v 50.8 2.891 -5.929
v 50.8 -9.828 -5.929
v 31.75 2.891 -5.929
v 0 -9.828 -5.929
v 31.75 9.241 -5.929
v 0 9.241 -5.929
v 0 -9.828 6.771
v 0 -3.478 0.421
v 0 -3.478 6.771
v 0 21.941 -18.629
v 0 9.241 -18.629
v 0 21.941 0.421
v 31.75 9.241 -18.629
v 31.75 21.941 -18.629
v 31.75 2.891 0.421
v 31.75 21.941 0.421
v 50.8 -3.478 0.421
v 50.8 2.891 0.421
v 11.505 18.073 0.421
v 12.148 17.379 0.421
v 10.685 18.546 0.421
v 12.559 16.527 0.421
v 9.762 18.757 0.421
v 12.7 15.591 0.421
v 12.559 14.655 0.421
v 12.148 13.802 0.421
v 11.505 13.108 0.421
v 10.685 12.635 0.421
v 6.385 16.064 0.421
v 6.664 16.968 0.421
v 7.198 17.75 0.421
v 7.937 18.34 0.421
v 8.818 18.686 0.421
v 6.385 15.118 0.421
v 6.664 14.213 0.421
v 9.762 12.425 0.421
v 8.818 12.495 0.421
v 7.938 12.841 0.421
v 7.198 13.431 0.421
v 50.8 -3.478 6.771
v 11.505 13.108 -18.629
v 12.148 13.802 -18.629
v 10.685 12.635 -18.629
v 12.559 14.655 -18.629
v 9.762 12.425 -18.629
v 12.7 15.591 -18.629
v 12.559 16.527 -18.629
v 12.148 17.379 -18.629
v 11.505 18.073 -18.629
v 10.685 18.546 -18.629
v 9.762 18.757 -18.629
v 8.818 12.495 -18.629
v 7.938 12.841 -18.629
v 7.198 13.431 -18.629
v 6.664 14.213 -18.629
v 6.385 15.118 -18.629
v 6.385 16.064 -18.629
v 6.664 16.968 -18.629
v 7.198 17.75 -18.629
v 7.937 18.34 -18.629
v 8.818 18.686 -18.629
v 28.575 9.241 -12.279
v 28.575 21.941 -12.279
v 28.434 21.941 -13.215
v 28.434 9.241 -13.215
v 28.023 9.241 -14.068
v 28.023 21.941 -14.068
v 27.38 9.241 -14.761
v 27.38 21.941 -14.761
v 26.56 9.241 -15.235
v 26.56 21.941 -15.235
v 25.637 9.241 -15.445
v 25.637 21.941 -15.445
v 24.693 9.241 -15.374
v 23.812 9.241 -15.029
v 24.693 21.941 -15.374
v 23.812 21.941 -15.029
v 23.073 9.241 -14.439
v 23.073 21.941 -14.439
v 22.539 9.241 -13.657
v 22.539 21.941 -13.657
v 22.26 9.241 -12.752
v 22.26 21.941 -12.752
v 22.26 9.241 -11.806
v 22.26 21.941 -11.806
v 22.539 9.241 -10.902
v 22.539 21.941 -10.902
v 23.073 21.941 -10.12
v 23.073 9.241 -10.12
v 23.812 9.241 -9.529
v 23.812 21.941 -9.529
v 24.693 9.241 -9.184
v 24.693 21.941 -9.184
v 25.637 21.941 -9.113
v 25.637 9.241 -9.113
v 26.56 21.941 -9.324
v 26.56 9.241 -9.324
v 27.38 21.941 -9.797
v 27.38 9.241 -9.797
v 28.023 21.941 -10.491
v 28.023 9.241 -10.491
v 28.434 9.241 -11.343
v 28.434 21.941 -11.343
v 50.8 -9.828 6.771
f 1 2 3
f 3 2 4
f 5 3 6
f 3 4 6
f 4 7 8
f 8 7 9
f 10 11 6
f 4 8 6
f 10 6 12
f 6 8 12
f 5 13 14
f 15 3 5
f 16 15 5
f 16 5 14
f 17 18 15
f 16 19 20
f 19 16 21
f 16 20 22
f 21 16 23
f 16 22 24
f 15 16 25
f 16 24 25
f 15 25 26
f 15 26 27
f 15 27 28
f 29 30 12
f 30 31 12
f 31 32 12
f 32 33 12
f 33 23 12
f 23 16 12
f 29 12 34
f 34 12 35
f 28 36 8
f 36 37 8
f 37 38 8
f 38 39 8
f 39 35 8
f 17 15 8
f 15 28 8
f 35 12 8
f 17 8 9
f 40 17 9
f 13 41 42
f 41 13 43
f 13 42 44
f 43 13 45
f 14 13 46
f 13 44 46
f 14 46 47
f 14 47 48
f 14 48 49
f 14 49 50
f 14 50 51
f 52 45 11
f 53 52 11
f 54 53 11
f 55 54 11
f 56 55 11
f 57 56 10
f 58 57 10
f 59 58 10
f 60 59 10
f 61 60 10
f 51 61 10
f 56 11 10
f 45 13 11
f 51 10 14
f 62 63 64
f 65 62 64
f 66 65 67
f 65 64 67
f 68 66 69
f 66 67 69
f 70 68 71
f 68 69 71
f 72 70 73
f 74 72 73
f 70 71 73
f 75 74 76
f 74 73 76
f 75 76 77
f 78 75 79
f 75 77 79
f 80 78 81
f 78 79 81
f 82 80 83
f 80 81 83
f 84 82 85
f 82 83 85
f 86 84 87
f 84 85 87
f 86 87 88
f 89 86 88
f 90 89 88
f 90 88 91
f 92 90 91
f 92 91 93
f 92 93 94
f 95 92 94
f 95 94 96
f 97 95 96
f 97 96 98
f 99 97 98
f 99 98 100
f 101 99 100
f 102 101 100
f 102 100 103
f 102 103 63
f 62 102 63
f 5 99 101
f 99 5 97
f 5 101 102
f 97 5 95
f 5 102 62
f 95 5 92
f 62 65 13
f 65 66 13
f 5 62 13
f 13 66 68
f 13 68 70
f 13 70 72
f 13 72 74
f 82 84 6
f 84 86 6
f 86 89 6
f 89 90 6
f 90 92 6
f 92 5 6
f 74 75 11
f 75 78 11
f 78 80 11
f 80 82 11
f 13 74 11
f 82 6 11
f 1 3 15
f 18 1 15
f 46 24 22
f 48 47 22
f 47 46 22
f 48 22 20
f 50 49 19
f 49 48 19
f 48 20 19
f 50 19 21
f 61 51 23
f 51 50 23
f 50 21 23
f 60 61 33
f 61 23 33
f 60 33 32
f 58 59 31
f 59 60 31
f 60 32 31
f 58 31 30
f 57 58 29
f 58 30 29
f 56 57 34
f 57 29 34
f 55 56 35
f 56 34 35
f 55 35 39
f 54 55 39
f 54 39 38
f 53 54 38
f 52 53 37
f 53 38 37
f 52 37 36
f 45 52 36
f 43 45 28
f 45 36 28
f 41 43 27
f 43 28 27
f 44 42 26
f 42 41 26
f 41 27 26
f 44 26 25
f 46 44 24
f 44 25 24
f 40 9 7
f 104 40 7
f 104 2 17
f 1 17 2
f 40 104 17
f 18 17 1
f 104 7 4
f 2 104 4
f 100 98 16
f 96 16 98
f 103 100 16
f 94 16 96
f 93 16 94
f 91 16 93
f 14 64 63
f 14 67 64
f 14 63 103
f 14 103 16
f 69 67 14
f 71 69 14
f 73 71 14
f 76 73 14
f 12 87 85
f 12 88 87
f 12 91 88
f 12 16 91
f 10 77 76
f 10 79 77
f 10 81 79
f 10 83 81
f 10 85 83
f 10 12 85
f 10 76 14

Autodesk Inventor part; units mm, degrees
ref_plane "YZ Plane" through (0, 0, 0) normal (1, 0, 0) x (0, 1, 0)
ref_plane "XZ Plane" through (0, 0, 0) normal (0, 1, 0) x (-1, 0, 0)
ref_plane "XY Plane" through (0, 0, 0) normal (0, 0, 1) x (1, 0, 0)
sketch "Sketch1" plane through (0, 0, 0) normal (1, 0, 0) x (0, 1, 0)
  line L0 (-3.4784, 6.7709) -> (-9.8284, 6.7709)
  line L1 (-9.8284, 6.7709) -> (-9.8284, -5.9291)
  line L2 (-9.8284, -5.9291) -> (-3.4784, -5.9291)
  line L3 (-3.4784, -5.9291) -> (-3.4784, 6.7709)
  line L4 (-9.8092, -5.9291) -> (2.8908, -5.9291)
  line L5 (2.8908, -5.9291) -> (2.8908, 0.4209)
  line L6 (2.8908, 0.4209) -> (-9.8092, 0.4209)
  line L7 (-9.8092, 0.4209) -> (-9.8092, -5.9291)
  line L8 (2.8908, 0.4209) -> (21.9408, 0.4209)
  line L9 (21.9408, 0.4209) -> (21.9408, -5.9291)
  line L10 (21.9408, -5.9291) -> (2.8908, -5.9291)
  line L11 (2.8908, -5.9291) -> (2.8908, 0.4209)
  line L12 (21.9408, 0.4209) -> (9.2408, 0.4209)
  line L13 (9.2408, 0.4209) -> (9.2408, -18.6291)
  line L14 (9.2408, -18.6291) -> (21.9408, -18.6291)
  line L15 (21.9408, -18.6291) -> (21.9408, 0.4209)
  point P0 (0, 0)
  dimension "d0" = 6.35
  dimension "d1" = 12.7
  dimension "d2" = 12.7
  dimension "d3" = 6.35
  dimension "d4" = 19.05
  dimension "d5" = 6.35
  dimension "d6" = 12.7
  dimension "d7" = 19.05
extrude "Extrusion1" add sketch "Sketch1" along normal blind 50.8 contours L3 L6 L7 L2 L1 L0 | L3 L2 L7 L6
extrude "Extrusion2" add sketch "Sketch1" along normal blind 31.75 contours L8 L13 L10 L5 | L8 L9 L10 L13
extrude "Extrusion3" cut sketch "Sketch1" along normal blind 50.8 contours L6 L5 L4 L3 | L3 L2 L7 L6
extrude "Extrusion4" add sketch "Sketch1" along normal blind 50.8 contours L6 L5 L4 L3 | L3 L2 L7 L6
extrude "Extrusion5" cut sketch "Sketch1" along normal blind 31.75 contours L8 L9 L10 L13 | L10 L15 L14 L13
extrude "Extrusion6" add sketch "Sketch1" along normal blind 31.75 contours L8 L9 L10 L13 | L10 L15 L14 L13
sketch "Sketch2" plane through (0, 21.9408, 0.4209) normal (0, 1, 0) x (1, 0, 0)
  line L0 (31.75, 12.7) -> (31.75, 19.05)
  circle A0 centre (25.4, 12.7) radius 3.175
  point P0 (0, 0.4209)
  dimension "d22" = 6.35
extrude "Extrusion7" cut sketch "Sketch2" against normal blind 12.7
sketch "Sketch3" plane through (0, -3.4784, 0.4209) normal (0, 0, 1) x (1, 0, 0)
  line L0 (0, 12.7192) -> (0, 25.4192) projected
  line L1 (0, 25.4192) -> (6.35, 25.4192)
  line L2 (0, 19.0692) -> (0, 25.4192)
  line L3 (6.35, 25.4192) -> (9.525, 25.4192)
  line L4 (9.525, 19.0692) -> (6.35, 19.0692)
  circle A0 centre (9.525, 19.0692) radius 3.175
  point P0 (0, 3.4784)
  dimension "d27" = 3.175
  dimension "d28" = 6.35
  dimension "d29" = 6.35
extrude "Extrusion8" cut sketch "Sketch3" against normal blind 25.4
